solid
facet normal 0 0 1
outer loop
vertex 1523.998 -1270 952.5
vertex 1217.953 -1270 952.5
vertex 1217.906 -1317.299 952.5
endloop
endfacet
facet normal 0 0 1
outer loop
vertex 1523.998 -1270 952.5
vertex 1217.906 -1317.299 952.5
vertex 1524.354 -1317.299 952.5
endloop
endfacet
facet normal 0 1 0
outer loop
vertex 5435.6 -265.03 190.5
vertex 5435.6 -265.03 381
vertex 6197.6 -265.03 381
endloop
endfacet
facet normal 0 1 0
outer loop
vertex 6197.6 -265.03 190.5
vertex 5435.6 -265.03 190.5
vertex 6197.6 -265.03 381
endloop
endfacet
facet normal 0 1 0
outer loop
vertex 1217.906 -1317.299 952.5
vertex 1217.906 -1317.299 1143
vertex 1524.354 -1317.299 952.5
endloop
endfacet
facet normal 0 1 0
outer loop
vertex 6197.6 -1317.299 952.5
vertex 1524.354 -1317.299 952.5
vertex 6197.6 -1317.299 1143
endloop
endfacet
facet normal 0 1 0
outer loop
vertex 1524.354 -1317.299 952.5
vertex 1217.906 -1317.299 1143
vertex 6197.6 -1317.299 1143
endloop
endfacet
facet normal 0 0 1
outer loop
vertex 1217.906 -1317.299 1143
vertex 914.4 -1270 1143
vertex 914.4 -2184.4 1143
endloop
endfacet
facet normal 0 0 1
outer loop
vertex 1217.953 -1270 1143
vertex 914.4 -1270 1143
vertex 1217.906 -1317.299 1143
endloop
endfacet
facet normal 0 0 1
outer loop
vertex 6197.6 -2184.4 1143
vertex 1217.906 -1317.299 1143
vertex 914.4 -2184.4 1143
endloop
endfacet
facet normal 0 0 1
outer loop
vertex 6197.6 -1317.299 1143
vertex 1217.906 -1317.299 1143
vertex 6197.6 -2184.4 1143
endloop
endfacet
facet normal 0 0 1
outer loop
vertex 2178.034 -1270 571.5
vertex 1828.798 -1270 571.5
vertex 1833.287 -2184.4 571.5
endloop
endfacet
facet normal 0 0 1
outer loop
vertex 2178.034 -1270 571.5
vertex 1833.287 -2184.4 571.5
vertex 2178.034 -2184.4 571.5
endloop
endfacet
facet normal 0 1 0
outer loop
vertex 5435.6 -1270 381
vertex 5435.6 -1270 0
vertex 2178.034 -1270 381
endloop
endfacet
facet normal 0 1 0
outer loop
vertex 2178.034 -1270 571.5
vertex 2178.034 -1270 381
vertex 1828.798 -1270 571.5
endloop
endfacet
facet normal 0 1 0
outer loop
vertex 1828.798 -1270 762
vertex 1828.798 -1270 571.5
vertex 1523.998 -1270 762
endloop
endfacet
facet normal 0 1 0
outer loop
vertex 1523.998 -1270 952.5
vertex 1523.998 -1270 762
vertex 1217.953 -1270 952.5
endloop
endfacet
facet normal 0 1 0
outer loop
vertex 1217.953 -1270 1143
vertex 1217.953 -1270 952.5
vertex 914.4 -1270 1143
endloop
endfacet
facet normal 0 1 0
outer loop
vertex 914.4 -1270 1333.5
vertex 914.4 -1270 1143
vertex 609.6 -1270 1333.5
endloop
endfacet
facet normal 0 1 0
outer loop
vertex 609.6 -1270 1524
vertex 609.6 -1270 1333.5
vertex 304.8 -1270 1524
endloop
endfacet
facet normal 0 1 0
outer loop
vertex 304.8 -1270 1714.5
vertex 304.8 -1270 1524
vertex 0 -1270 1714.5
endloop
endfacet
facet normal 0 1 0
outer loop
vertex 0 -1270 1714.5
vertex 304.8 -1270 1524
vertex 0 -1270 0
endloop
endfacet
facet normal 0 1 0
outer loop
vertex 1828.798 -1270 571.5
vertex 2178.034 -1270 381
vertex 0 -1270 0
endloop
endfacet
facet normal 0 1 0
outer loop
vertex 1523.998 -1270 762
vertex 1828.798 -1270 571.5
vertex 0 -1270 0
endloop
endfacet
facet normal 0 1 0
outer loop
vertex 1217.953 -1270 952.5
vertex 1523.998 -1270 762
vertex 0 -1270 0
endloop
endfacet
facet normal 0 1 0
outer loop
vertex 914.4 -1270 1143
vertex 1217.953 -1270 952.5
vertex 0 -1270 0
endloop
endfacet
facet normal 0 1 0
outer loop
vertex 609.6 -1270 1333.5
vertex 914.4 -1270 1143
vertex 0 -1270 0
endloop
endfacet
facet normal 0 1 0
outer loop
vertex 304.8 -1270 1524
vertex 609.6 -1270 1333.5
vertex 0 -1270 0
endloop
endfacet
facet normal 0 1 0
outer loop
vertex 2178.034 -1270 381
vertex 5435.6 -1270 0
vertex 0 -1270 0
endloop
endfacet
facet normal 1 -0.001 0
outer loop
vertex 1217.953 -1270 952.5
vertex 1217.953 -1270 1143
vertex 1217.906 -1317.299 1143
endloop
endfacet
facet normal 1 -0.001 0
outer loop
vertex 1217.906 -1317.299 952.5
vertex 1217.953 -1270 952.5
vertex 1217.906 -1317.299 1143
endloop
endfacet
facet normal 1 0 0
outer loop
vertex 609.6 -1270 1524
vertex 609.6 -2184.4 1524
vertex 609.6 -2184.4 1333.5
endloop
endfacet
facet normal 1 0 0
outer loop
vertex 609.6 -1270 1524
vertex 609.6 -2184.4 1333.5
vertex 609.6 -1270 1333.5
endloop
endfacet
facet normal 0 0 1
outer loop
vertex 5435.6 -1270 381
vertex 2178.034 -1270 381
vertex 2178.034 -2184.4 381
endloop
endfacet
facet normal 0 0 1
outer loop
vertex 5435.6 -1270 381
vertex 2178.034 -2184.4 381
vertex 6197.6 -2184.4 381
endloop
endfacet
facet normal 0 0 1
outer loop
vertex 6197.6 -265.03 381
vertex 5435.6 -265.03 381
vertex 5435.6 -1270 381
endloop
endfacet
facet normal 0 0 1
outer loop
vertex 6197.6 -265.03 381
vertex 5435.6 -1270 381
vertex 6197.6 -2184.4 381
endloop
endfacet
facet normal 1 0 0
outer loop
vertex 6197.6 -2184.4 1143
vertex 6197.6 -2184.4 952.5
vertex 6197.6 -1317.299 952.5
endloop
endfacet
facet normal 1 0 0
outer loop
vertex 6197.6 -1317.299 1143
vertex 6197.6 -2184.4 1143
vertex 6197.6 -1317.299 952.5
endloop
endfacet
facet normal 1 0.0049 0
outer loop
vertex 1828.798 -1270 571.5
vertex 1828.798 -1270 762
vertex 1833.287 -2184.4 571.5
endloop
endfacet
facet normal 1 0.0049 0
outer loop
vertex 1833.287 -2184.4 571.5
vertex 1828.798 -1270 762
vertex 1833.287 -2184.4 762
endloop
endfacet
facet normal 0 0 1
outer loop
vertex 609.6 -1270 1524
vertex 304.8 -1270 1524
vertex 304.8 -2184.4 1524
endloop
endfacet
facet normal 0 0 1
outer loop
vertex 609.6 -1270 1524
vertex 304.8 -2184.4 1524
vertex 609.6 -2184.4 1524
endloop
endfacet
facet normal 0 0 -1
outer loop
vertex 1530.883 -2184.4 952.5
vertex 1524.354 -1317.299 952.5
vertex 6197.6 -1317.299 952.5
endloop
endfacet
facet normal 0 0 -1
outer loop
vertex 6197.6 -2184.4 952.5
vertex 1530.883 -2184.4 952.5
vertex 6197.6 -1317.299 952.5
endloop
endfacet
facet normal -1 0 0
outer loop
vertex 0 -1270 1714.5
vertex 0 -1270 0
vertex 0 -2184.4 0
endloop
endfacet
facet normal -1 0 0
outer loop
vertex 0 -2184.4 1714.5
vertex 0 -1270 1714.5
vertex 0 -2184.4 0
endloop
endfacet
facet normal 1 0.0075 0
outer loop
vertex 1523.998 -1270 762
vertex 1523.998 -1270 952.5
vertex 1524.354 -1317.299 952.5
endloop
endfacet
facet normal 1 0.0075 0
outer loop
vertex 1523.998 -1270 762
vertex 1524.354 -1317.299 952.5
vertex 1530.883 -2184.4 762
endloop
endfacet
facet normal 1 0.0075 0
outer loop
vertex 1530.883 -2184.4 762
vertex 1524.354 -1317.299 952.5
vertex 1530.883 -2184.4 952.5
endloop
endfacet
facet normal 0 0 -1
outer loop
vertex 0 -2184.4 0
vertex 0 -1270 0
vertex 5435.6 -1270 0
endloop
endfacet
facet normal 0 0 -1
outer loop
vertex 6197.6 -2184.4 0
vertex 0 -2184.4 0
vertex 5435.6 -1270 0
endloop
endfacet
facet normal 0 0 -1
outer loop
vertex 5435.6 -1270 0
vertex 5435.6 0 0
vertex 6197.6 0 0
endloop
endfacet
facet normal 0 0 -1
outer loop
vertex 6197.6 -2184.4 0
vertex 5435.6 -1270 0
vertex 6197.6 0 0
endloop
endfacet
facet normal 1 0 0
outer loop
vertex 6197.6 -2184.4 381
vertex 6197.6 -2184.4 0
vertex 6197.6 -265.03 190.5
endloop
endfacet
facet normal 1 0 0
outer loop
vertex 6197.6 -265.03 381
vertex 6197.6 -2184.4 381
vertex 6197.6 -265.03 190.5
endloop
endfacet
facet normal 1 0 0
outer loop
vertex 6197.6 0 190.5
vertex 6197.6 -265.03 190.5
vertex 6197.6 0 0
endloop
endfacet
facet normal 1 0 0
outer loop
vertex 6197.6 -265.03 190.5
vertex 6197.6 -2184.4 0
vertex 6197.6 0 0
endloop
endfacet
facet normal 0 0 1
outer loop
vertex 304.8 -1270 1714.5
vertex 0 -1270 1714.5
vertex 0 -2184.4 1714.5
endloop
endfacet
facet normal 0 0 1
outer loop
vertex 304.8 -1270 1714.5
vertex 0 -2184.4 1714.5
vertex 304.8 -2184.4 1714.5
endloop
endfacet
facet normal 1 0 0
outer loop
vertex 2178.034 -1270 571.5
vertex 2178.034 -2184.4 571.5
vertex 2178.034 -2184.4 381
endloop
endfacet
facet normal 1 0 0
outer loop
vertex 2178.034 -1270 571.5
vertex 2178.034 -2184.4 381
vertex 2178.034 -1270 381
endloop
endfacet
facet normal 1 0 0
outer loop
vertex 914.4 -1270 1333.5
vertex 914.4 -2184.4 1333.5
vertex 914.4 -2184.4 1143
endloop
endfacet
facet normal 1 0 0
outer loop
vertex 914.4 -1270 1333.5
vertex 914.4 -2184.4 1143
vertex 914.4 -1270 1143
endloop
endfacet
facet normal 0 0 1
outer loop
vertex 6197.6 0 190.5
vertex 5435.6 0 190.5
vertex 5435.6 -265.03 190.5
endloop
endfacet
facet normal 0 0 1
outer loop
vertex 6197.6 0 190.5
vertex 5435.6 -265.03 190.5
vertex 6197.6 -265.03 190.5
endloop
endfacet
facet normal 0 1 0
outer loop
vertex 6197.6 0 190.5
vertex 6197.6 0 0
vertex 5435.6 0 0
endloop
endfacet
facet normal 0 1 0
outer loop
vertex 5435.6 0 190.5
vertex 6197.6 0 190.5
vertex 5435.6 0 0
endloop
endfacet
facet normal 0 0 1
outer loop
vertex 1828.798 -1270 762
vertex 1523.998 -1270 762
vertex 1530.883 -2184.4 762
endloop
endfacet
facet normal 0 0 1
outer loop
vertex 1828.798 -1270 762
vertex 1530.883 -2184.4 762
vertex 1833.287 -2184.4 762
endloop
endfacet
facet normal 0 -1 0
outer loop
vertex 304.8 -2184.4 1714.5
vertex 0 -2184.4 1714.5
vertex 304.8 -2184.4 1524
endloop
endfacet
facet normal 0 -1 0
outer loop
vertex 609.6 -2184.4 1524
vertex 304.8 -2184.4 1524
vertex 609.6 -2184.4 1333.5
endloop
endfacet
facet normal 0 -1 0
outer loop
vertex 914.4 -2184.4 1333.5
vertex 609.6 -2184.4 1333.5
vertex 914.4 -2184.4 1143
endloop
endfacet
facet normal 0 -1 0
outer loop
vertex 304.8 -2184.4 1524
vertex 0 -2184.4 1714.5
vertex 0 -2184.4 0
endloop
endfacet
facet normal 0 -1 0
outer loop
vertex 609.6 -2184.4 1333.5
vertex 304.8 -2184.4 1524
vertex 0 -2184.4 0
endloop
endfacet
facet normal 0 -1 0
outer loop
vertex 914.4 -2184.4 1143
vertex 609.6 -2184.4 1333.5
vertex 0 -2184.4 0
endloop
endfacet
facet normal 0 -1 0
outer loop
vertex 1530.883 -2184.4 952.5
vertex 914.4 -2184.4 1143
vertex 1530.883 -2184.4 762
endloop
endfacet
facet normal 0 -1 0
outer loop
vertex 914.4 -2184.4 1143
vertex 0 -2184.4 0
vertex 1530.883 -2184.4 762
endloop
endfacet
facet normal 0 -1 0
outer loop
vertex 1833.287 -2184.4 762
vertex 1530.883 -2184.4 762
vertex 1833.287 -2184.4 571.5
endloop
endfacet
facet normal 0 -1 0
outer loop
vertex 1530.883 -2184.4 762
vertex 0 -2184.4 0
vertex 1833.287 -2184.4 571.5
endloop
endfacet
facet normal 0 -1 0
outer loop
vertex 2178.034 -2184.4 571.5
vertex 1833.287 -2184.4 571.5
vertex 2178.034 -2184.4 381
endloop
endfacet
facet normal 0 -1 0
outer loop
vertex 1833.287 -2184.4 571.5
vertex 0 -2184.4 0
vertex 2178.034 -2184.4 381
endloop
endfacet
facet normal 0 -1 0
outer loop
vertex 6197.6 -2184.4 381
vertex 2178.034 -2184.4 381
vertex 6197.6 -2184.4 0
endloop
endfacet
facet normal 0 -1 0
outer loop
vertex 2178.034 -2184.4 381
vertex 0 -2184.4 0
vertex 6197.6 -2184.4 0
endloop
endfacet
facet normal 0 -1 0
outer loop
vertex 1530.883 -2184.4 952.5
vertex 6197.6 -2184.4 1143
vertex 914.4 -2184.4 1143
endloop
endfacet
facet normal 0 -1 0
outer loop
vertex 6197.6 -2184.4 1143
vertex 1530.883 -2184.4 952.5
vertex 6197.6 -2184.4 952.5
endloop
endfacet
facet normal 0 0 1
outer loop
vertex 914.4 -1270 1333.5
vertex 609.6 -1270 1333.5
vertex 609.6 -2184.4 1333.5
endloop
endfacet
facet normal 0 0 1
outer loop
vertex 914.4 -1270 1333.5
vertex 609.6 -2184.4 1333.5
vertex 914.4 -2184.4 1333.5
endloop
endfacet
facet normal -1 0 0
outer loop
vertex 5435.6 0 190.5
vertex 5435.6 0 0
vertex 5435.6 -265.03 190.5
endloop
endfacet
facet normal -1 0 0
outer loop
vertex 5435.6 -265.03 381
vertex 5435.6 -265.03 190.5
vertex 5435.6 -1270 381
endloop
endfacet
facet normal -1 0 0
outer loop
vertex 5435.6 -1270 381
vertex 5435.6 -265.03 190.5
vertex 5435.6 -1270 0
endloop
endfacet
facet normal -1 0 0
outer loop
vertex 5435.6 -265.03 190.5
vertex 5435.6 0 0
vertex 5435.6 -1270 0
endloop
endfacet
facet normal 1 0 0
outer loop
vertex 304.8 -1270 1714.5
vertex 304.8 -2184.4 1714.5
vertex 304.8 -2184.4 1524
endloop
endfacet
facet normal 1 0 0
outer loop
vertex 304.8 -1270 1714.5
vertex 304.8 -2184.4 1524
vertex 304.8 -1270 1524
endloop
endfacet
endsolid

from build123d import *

# Parameters (mm, degrees)
F1_DEPTH  = 1714.5
F2_W      = 6769.754784
F2_H      = 2650.100802
F3_DEPTH  = 190.5
F4_W      = 6116.649264
F4_H      = 2878.354555
F5_DEPTH  = 190.5
F6_W      = 5600.98028
F6_H      = 2779.137729
F7_DEPTH  = 190.5
F9_DEPTH  = 190.5
F11_DEPTH = 190.5
F13_DEPTH = 190.5
F14_W     = 4581.816315
F14_H     = 3964.371144
F15_DEPTH = 190.5
F16_W     = 2687.302113
F16_H     = 397.61959
F17_DEPTH = 190.5


with BuildPart() as f1:
    # F0 (on Top) → F1 (new body)
    with BuildSketch(Plane.XY):
        Polygon((5435.6, -1270), (0, -1270), (0, -2184.4), (6197.6, -2184.4), (6197.6, 0), (5435.6, 0), align=None)
    extrude(amount=F1_DEPTH)

    # F2 (on face) → F3 (cut)
    with BuildSketch(Plane.XY.offset(1714.5)):
        with Locations((3689.677392, -1017.397985)):
            Rectangle(F2_W, F2_H)
    extrude(amount=-F3_DEPTH, mode=Mode.SUBTRACT)

    # F4 (on face) → F5 (cut)
    with BuildSketch(Plane.XY.offset(1524)):
        with Locations((3667.924632, -1029.948004)):
            Rectangle(F4_W, F4_H)
    extrude(amount=-F5_DEPTH, mode=Mode.SUBTRACT)

    # F6 (on face) → F7 (cut)
    with BuildSketch(Plane.XY.offset(1333.5)):
        with Locations((3714.89014, -1209.748089)):
            Rectangle(F6_W, F6_H)
    extrude(amount=-F7_DEPTH, mode=Mode.SUBTRACT)

    # F8 (on face) → F9 (cut)
    with BuildSketch(Plane.XY.offset(1143)):
        Polygon((6557.625086, 1586.404227), (1220.647244, 1473.571761), (1217.906237, -1317.29927), (6557.625086, -1317.29927), align=None)
    extrude(amount=-F9_DEPTH, mode=Mode.SUBTRACT)

    # F10 (on face) → F11 (cut)
    with BuildSketch(Plane.XY.offset(952.5)):
        Polygon((6549.054911, 597.07729), (1512.735535, 225.73574), (1533.949639, -2591.752768), (7090.906833, -2591.752768), align=None)
    extrude(amount=-F11_DEPTH, mode=Mode.SUBTRACT)

    # F12 (on face) → F13 (cut)
    with BuildSketch(Plane.XY.offset(762)):
        Polygon((6558.934754, 203.396683), (1822.20658, 72.947555), (1834.353823, -2401.819355), (6510.601342, -2558.526313), align=None)
    extrude(amount=-F13_DEPTH, mode=Mode.SUBTRACT)

    # F14 (on face) → F15 (cut)
    with BuildSketch(Plane.XY.offset(571.5)):
        with Locations((4468.941867, -1327.456981)):
            Rectangle(F14_W, F14_H)
    extrude(amount=-F15_DEPTH, mode=Mode.SUBTRACT)

    # F16 (on face) → F17 (cut)
    with BuildSketch(Plane.XY.offset(381)):
        with Locations((5400.902509, -66.219874)):
            Rectangle(F16_W, F16_H)
    extrude(amount=-F17_DEPTH, mode=Mode.SUBTRACT)


solid = f1.part
